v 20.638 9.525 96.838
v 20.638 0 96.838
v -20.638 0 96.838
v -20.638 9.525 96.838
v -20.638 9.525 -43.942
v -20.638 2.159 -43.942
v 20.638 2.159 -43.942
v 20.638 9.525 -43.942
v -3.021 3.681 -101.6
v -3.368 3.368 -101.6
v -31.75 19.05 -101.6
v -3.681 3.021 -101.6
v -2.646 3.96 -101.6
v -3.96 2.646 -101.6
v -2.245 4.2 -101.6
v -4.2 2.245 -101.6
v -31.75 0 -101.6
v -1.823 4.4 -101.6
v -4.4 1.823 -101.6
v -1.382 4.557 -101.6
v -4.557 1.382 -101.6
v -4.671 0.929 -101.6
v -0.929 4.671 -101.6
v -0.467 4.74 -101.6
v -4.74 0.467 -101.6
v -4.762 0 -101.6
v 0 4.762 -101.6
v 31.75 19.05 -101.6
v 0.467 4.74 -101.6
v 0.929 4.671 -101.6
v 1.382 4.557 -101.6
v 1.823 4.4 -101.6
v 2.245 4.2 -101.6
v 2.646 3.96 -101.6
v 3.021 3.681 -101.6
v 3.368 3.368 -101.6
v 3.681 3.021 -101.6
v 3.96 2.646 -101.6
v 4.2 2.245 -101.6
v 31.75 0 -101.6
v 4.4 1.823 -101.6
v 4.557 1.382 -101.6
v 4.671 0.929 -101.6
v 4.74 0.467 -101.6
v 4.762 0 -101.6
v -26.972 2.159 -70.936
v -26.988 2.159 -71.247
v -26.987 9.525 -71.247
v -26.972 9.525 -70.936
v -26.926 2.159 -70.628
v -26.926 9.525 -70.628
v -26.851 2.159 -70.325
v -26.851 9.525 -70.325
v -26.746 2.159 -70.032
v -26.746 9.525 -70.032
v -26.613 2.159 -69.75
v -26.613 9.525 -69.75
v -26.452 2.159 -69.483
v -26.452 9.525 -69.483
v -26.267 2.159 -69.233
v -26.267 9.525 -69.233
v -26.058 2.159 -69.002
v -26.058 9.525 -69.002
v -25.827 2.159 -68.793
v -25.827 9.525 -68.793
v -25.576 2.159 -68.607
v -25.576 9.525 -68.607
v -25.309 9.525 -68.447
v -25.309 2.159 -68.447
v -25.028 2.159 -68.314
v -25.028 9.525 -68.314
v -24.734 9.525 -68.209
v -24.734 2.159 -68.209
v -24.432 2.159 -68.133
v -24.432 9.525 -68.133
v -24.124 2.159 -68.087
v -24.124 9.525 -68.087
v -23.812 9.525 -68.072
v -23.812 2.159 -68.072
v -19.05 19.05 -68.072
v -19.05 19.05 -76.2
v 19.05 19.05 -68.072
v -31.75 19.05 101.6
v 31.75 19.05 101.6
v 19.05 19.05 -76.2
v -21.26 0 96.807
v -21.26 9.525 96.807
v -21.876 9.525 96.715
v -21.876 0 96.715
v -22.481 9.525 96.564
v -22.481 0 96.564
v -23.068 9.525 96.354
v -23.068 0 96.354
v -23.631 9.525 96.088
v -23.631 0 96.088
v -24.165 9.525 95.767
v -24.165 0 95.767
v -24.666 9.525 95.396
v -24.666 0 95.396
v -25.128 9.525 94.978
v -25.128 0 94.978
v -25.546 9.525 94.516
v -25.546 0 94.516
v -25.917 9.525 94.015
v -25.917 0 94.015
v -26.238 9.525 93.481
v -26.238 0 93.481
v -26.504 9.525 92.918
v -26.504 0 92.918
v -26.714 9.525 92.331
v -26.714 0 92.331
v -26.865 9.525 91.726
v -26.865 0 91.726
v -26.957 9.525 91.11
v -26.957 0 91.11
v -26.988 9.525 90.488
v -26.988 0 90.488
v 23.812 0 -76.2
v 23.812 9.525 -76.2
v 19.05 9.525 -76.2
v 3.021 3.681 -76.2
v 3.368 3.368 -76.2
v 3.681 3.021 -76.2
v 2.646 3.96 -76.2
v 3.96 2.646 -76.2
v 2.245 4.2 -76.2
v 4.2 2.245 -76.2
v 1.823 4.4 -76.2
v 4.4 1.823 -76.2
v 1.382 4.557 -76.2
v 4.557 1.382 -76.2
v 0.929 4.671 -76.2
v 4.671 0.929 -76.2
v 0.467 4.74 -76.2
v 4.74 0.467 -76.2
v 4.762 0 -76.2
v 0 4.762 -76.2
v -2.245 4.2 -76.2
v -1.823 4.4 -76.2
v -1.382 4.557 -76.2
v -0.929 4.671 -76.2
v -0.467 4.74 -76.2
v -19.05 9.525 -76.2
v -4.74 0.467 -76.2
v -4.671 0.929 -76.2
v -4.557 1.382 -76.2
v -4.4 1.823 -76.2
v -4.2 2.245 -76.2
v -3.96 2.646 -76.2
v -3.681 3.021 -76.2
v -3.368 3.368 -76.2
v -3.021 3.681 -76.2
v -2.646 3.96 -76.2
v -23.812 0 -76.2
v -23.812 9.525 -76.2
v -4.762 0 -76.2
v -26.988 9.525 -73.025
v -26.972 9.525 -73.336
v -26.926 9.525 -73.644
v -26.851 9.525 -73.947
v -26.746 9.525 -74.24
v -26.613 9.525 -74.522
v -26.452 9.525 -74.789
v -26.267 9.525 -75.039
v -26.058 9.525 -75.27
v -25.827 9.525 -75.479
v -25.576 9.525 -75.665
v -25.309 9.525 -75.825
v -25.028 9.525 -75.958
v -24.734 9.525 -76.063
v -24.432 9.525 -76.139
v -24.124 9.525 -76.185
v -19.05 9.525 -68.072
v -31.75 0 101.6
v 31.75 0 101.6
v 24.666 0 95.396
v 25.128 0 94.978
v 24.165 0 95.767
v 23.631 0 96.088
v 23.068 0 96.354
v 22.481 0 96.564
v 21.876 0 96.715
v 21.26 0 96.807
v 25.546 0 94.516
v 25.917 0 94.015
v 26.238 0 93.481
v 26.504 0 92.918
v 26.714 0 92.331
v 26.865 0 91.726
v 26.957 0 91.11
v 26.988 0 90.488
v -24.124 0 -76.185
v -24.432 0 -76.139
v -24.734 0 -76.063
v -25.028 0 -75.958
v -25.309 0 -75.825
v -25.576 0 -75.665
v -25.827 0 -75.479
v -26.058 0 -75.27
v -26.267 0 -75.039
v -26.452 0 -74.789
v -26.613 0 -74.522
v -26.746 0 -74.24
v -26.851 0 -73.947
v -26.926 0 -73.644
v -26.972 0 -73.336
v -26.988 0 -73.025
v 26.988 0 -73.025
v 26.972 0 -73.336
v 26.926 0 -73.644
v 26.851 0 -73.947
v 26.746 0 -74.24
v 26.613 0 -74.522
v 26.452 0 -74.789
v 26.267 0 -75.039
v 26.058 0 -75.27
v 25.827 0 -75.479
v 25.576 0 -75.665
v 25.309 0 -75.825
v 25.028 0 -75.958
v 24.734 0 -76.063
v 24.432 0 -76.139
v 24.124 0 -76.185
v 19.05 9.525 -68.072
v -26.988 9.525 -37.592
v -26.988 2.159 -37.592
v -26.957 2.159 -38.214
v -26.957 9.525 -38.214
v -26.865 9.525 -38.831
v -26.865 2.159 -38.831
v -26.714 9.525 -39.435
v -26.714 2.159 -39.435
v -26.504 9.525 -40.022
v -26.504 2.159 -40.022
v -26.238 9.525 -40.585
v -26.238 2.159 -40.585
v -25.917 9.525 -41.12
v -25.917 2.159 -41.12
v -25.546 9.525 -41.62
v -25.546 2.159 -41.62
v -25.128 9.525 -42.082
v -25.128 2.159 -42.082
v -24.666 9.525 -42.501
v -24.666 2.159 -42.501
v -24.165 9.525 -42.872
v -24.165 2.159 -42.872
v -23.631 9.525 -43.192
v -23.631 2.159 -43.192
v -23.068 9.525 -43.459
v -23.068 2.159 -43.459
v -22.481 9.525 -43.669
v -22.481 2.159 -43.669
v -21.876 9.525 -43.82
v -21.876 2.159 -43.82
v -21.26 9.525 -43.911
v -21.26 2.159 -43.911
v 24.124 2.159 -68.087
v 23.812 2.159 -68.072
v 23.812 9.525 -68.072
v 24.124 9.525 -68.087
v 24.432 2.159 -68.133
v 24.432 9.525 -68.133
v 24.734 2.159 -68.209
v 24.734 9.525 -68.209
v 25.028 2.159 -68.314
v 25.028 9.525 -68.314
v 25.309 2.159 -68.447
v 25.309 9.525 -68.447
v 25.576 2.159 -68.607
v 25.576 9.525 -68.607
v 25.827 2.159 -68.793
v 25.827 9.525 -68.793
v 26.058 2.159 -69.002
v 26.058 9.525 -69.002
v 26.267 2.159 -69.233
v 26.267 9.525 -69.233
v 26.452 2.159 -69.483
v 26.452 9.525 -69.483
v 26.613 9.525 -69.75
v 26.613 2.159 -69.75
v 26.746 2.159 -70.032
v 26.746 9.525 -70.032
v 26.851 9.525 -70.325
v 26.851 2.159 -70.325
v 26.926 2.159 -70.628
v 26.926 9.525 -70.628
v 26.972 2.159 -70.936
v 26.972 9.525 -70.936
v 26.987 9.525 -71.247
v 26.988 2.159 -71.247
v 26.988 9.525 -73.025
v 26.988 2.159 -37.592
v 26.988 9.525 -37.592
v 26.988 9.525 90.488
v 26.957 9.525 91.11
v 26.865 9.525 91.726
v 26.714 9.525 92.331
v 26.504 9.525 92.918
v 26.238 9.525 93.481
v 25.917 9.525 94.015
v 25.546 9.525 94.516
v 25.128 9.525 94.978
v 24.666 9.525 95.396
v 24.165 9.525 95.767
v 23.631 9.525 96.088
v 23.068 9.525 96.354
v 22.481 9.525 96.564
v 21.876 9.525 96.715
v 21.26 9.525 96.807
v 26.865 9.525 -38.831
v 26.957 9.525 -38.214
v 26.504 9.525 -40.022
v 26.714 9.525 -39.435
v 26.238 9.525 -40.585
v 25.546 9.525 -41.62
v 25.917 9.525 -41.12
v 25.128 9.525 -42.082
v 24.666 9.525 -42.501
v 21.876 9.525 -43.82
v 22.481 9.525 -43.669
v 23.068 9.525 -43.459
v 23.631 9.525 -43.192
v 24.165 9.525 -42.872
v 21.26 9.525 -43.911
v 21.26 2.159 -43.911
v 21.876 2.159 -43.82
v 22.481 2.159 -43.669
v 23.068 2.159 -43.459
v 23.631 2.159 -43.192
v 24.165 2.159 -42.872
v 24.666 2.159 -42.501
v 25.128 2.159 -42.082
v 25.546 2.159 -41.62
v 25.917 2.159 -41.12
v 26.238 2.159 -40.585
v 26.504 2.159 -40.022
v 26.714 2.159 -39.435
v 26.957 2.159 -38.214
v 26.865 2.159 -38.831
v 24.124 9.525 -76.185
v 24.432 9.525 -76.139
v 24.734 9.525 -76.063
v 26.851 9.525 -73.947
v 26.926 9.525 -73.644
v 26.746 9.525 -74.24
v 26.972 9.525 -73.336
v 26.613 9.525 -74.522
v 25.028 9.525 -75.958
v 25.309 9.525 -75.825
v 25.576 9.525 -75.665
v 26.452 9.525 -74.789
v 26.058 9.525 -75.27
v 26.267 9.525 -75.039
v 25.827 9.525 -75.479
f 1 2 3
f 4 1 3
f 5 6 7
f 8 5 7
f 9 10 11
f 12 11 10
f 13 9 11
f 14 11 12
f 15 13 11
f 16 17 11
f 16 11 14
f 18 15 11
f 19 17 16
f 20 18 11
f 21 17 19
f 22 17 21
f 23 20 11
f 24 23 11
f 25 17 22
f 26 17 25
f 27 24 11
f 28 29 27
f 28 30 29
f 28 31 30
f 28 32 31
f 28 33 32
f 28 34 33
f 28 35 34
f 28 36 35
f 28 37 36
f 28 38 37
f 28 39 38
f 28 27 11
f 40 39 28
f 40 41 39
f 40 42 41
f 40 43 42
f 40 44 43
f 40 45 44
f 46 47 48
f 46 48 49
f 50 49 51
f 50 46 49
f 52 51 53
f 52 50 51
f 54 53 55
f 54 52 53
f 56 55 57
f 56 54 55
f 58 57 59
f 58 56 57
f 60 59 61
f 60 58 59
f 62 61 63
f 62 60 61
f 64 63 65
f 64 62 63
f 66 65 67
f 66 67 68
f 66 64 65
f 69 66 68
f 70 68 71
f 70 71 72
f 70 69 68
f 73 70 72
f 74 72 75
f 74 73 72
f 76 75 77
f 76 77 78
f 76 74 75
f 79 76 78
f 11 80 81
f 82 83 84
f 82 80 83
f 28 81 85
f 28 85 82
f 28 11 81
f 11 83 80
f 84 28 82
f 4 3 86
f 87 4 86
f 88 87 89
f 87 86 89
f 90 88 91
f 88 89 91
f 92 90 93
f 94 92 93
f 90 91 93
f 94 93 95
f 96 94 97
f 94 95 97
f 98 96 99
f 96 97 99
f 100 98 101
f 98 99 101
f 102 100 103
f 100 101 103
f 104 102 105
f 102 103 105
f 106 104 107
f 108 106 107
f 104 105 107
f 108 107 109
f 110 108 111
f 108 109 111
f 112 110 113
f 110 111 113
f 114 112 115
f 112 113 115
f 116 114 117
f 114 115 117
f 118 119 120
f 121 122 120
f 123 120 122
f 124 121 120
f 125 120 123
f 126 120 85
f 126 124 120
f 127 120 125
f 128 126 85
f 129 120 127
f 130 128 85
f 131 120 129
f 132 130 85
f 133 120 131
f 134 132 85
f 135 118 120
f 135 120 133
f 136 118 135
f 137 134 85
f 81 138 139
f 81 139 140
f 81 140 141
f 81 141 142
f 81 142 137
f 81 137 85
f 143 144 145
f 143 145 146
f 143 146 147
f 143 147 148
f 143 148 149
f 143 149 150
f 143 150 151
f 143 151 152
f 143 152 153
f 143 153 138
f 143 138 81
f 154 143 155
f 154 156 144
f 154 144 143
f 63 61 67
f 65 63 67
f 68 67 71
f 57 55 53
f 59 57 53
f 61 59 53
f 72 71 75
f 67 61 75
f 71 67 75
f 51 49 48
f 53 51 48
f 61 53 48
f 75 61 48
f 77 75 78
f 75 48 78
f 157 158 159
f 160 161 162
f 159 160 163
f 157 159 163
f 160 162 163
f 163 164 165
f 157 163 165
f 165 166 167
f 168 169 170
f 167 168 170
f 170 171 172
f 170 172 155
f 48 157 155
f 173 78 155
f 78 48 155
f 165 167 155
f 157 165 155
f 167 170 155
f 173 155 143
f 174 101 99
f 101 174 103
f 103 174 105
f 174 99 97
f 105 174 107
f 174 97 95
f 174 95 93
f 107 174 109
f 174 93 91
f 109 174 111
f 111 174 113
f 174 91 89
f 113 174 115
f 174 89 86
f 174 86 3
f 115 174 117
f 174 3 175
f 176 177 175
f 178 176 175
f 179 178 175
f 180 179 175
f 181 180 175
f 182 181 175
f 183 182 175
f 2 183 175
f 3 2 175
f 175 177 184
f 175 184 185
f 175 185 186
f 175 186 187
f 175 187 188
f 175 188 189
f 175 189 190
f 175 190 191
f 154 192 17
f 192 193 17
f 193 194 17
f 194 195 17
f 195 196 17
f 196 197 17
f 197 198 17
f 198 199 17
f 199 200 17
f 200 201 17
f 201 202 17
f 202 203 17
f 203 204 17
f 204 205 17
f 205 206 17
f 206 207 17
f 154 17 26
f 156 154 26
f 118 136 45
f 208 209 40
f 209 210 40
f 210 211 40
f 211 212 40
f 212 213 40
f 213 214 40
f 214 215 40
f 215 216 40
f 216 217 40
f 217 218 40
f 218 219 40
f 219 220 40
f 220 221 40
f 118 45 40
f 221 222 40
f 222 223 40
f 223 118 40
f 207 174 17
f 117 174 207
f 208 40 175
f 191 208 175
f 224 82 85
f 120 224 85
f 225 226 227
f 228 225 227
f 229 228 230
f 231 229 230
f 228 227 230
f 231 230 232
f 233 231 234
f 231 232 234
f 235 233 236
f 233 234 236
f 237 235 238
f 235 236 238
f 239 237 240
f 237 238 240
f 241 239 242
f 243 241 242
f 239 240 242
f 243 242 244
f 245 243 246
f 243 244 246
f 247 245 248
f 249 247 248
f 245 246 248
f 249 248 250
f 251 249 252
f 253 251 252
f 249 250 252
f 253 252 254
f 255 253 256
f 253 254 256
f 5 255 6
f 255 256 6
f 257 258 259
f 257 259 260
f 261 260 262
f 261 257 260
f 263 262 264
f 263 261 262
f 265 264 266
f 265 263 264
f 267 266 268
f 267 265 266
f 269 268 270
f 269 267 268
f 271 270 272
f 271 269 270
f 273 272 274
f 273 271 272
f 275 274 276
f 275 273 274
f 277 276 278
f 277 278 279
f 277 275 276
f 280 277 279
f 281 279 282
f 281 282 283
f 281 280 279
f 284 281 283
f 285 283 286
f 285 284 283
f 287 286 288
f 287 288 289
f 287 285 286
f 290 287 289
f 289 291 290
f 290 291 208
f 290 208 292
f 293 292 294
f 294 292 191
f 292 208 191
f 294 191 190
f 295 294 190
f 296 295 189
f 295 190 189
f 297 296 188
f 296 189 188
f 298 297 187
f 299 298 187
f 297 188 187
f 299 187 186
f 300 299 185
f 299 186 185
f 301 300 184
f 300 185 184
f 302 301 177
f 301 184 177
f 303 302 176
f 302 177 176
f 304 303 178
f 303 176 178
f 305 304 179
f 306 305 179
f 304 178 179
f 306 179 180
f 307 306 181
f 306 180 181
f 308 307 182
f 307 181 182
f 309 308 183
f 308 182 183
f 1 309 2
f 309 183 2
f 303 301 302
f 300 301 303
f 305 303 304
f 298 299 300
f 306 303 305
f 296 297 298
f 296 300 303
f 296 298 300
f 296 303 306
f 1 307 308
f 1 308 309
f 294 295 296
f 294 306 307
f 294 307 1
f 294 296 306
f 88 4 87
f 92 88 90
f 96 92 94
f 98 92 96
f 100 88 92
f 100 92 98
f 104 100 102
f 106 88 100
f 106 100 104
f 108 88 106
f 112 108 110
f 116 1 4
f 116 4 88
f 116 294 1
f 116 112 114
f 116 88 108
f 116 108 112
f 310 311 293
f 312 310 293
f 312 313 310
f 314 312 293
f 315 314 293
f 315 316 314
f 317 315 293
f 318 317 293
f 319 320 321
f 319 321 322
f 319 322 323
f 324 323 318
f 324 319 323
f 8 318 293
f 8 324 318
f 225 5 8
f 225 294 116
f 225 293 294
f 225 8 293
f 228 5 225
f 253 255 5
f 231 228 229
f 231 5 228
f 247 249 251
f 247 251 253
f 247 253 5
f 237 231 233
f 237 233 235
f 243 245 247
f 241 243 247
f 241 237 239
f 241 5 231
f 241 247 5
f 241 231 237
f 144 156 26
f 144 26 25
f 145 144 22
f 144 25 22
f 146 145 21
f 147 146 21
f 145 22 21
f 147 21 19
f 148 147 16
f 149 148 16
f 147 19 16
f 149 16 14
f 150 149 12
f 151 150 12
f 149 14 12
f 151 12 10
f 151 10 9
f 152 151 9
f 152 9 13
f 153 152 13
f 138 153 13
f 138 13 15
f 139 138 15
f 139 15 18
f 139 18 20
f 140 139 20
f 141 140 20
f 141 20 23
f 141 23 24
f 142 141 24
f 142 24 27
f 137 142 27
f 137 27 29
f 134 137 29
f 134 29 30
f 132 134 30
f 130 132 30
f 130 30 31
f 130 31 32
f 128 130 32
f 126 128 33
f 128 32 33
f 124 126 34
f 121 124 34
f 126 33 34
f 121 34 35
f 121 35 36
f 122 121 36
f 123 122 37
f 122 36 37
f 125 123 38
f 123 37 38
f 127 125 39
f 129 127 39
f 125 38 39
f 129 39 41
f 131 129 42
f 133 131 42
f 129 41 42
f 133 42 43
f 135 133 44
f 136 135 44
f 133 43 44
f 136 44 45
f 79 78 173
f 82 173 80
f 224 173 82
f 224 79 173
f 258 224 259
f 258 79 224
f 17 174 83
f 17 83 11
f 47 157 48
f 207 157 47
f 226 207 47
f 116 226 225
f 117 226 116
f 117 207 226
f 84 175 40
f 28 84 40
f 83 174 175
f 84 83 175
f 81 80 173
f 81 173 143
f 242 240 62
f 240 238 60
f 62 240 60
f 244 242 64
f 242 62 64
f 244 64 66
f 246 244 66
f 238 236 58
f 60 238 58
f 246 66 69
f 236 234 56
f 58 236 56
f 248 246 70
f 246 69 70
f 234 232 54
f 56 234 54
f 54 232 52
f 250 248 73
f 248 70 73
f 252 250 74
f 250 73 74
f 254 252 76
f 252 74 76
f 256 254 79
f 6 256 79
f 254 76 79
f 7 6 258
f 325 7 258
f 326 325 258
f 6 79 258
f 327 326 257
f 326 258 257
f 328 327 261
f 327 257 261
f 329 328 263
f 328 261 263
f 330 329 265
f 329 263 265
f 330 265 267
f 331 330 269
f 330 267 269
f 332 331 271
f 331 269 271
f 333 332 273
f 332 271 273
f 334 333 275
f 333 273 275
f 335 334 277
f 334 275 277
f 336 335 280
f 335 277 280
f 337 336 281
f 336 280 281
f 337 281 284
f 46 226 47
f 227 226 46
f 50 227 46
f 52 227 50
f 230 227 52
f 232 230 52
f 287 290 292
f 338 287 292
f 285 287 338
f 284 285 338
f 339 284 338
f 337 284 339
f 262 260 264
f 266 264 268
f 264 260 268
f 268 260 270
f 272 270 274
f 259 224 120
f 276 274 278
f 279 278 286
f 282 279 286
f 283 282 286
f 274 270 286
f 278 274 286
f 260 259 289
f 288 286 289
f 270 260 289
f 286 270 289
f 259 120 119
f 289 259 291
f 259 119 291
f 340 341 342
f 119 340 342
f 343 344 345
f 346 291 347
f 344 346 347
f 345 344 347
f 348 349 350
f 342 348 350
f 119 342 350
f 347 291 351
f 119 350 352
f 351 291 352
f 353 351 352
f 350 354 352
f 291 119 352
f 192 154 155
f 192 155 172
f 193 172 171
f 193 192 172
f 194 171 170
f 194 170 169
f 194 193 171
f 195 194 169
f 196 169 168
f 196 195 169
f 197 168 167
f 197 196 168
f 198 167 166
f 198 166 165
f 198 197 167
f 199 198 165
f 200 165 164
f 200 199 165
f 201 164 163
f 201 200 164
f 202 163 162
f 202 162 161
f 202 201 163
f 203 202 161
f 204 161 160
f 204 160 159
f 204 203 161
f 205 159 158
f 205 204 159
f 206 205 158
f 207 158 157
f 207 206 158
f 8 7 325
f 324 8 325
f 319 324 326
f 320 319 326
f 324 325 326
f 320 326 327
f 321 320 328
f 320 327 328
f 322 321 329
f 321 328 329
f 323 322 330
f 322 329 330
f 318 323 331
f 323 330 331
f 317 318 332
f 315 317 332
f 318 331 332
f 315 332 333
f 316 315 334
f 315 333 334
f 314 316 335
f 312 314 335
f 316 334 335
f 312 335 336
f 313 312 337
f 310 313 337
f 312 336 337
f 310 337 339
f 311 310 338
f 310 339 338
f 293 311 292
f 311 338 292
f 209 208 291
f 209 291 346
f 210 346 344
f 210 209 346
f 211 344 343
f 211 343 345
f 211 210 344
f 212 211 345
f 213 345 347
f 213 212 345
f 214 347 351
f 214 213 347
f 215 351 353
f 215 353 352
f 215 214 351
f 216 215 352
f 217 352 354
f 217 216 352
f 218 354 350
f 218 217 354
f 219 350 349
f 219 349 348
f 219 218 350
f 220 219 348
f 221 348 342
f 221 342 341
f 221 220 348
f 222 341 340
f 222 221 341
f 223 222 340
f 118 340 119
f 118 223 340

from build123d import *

# Parameters (mm, degrees)
SKETCH1_W           = 63.5
SKETCH1_H           = 203.2
BOSS_EXTRUDE1_DEPTH = 19.05
SKETCH2_R           = 4.7625
CUT_EXTRUDE1_DEPTH  = 25.4
CUT_EXTRUDE2_DEPTH  = 9.525
SKETCH5_W           = 38.1
SKETCH5_H           = 8.128
CUT_EXTRUDE4_DEPTH  = 109.136603424
SKETCH6_W           = 53.975
SKETCH6_H           = 33.655
CUT_EXTRUDE5_DEPTH  = 2.159


with BuildPart() as part:
    # Sketch1 → Boss-Extrude1 (new body)
    with BuildSketch(Plane(origin=(0, 0, 0), x_dir=(1, 0, 0), z_dir=(0, 1, 0))):
        Rectangle(SKETCH1_W, SKETCH1_H)
    extrude(amount=BOSS_EXTRUDE1_DEPTH)

    # Sketch2 → Cut-Extrude1 (cut)
    with BuildSketch(Plane(origin=(0, 0, -101.6), x_dir=(-1, 0, 0), z_dir=(0, 0, -1))):
        Circle(SKETCH2_R)
    extrude(amount=-CUT_EXTRUDE1_DEPTH, mode=Mode.SUBTRACT)

    # Sketch3 → Cut-Extrude2 (cut)
    with BuildSketch(Plane(origin=(0, 0, 0), x_dir=(-1, 0, 0), z_dir=(0, -1, 0))):
        with BuildLine():
            Line((-20.6375, -96.8375), (20.6375, -96.8375))
            ThreePointArc((20.6375, -96.8375), (25.127628061, -94.977628061), (26.9875, -90.4875))
            Line((26.9875, -90.4875), (26.9875, 37.592))
            ThreePointArc((26.9875, 37.592), (25.127628061, 42.082128061), (20.6375, 43.942))
            Line((20.6375, 43.942), (-20.6375, 43.942))
            ThreePointArc((-20.6375, 43.942), (-25.127628061, 42.082128061), (-26.9875, 37.592))
            Line((-26.9875, 37.592), (-26.9875, -90.4875))
            ThreePointArc((-26.9875, -90.4875), (-25.127628061, -94.977628061), (-20.6375, -96.8375))
        make_face()
        with BuildLine():
            Line((-23.8125, 76.2), (23.8125, 76.2))
            ThreePointArc((23.8125, 76.2), (26.05756403, 75.27006403), (26.9875, 73.025))
            Line((26.9875, 73.025), (26.9875, 71.247))
            ThreePointArc((26.9875, 71.247), (26.05756403, 69.00193597), (23.8125, 68.072))
            Line((23.8125, 68.072), (-23.8125, 68.072))
            ThreePointArc((-23.8125, 68.072), (-26.05756403, 69.00193597), (-26.9875, 71.247))
            Line((-26.9875, 71.247), (-26.9875, 73.025))
            ThreePointArc((-26.9875, 73.025), (-26.05756403, 75.27006403), (-23.8125, 76.2))
        make_face()
    extrude(amount=-CUT_EXTRUDE2_DEPTH, mode=Mode.SUBTRACT)

    # Sketch5 → Cut-Extrude4 (cut, through all)
    with BuildSketch(Plane(origin=(0, 0, 0), x_dir=(1, 0, 0), z_dir=(0, 1, 0))):
        with Locations((0, 72.136)):
            Rectangle(SKETCH5_W, SKETCH5_H)
    extrude(amount=CUT_EXTRUDE4_DEPTH, mode=Mode.SUBTRACT)

    # Sketch6 → Cut-Extrude5 (cut)
    with BuildSketch(Plane(origin=(0, 0, 0), x_dir=(1, 0, 0), z_dir=(0, 1, 0))):
        with Locations((0, 54.4195)):
            Rectangle(SKETCH6_W, SKETCH6_H)
    extrude(amount=CUT_EXTRUDE5_DEPTH, mode=Mode.SUBTRACT)


solid = part.part
